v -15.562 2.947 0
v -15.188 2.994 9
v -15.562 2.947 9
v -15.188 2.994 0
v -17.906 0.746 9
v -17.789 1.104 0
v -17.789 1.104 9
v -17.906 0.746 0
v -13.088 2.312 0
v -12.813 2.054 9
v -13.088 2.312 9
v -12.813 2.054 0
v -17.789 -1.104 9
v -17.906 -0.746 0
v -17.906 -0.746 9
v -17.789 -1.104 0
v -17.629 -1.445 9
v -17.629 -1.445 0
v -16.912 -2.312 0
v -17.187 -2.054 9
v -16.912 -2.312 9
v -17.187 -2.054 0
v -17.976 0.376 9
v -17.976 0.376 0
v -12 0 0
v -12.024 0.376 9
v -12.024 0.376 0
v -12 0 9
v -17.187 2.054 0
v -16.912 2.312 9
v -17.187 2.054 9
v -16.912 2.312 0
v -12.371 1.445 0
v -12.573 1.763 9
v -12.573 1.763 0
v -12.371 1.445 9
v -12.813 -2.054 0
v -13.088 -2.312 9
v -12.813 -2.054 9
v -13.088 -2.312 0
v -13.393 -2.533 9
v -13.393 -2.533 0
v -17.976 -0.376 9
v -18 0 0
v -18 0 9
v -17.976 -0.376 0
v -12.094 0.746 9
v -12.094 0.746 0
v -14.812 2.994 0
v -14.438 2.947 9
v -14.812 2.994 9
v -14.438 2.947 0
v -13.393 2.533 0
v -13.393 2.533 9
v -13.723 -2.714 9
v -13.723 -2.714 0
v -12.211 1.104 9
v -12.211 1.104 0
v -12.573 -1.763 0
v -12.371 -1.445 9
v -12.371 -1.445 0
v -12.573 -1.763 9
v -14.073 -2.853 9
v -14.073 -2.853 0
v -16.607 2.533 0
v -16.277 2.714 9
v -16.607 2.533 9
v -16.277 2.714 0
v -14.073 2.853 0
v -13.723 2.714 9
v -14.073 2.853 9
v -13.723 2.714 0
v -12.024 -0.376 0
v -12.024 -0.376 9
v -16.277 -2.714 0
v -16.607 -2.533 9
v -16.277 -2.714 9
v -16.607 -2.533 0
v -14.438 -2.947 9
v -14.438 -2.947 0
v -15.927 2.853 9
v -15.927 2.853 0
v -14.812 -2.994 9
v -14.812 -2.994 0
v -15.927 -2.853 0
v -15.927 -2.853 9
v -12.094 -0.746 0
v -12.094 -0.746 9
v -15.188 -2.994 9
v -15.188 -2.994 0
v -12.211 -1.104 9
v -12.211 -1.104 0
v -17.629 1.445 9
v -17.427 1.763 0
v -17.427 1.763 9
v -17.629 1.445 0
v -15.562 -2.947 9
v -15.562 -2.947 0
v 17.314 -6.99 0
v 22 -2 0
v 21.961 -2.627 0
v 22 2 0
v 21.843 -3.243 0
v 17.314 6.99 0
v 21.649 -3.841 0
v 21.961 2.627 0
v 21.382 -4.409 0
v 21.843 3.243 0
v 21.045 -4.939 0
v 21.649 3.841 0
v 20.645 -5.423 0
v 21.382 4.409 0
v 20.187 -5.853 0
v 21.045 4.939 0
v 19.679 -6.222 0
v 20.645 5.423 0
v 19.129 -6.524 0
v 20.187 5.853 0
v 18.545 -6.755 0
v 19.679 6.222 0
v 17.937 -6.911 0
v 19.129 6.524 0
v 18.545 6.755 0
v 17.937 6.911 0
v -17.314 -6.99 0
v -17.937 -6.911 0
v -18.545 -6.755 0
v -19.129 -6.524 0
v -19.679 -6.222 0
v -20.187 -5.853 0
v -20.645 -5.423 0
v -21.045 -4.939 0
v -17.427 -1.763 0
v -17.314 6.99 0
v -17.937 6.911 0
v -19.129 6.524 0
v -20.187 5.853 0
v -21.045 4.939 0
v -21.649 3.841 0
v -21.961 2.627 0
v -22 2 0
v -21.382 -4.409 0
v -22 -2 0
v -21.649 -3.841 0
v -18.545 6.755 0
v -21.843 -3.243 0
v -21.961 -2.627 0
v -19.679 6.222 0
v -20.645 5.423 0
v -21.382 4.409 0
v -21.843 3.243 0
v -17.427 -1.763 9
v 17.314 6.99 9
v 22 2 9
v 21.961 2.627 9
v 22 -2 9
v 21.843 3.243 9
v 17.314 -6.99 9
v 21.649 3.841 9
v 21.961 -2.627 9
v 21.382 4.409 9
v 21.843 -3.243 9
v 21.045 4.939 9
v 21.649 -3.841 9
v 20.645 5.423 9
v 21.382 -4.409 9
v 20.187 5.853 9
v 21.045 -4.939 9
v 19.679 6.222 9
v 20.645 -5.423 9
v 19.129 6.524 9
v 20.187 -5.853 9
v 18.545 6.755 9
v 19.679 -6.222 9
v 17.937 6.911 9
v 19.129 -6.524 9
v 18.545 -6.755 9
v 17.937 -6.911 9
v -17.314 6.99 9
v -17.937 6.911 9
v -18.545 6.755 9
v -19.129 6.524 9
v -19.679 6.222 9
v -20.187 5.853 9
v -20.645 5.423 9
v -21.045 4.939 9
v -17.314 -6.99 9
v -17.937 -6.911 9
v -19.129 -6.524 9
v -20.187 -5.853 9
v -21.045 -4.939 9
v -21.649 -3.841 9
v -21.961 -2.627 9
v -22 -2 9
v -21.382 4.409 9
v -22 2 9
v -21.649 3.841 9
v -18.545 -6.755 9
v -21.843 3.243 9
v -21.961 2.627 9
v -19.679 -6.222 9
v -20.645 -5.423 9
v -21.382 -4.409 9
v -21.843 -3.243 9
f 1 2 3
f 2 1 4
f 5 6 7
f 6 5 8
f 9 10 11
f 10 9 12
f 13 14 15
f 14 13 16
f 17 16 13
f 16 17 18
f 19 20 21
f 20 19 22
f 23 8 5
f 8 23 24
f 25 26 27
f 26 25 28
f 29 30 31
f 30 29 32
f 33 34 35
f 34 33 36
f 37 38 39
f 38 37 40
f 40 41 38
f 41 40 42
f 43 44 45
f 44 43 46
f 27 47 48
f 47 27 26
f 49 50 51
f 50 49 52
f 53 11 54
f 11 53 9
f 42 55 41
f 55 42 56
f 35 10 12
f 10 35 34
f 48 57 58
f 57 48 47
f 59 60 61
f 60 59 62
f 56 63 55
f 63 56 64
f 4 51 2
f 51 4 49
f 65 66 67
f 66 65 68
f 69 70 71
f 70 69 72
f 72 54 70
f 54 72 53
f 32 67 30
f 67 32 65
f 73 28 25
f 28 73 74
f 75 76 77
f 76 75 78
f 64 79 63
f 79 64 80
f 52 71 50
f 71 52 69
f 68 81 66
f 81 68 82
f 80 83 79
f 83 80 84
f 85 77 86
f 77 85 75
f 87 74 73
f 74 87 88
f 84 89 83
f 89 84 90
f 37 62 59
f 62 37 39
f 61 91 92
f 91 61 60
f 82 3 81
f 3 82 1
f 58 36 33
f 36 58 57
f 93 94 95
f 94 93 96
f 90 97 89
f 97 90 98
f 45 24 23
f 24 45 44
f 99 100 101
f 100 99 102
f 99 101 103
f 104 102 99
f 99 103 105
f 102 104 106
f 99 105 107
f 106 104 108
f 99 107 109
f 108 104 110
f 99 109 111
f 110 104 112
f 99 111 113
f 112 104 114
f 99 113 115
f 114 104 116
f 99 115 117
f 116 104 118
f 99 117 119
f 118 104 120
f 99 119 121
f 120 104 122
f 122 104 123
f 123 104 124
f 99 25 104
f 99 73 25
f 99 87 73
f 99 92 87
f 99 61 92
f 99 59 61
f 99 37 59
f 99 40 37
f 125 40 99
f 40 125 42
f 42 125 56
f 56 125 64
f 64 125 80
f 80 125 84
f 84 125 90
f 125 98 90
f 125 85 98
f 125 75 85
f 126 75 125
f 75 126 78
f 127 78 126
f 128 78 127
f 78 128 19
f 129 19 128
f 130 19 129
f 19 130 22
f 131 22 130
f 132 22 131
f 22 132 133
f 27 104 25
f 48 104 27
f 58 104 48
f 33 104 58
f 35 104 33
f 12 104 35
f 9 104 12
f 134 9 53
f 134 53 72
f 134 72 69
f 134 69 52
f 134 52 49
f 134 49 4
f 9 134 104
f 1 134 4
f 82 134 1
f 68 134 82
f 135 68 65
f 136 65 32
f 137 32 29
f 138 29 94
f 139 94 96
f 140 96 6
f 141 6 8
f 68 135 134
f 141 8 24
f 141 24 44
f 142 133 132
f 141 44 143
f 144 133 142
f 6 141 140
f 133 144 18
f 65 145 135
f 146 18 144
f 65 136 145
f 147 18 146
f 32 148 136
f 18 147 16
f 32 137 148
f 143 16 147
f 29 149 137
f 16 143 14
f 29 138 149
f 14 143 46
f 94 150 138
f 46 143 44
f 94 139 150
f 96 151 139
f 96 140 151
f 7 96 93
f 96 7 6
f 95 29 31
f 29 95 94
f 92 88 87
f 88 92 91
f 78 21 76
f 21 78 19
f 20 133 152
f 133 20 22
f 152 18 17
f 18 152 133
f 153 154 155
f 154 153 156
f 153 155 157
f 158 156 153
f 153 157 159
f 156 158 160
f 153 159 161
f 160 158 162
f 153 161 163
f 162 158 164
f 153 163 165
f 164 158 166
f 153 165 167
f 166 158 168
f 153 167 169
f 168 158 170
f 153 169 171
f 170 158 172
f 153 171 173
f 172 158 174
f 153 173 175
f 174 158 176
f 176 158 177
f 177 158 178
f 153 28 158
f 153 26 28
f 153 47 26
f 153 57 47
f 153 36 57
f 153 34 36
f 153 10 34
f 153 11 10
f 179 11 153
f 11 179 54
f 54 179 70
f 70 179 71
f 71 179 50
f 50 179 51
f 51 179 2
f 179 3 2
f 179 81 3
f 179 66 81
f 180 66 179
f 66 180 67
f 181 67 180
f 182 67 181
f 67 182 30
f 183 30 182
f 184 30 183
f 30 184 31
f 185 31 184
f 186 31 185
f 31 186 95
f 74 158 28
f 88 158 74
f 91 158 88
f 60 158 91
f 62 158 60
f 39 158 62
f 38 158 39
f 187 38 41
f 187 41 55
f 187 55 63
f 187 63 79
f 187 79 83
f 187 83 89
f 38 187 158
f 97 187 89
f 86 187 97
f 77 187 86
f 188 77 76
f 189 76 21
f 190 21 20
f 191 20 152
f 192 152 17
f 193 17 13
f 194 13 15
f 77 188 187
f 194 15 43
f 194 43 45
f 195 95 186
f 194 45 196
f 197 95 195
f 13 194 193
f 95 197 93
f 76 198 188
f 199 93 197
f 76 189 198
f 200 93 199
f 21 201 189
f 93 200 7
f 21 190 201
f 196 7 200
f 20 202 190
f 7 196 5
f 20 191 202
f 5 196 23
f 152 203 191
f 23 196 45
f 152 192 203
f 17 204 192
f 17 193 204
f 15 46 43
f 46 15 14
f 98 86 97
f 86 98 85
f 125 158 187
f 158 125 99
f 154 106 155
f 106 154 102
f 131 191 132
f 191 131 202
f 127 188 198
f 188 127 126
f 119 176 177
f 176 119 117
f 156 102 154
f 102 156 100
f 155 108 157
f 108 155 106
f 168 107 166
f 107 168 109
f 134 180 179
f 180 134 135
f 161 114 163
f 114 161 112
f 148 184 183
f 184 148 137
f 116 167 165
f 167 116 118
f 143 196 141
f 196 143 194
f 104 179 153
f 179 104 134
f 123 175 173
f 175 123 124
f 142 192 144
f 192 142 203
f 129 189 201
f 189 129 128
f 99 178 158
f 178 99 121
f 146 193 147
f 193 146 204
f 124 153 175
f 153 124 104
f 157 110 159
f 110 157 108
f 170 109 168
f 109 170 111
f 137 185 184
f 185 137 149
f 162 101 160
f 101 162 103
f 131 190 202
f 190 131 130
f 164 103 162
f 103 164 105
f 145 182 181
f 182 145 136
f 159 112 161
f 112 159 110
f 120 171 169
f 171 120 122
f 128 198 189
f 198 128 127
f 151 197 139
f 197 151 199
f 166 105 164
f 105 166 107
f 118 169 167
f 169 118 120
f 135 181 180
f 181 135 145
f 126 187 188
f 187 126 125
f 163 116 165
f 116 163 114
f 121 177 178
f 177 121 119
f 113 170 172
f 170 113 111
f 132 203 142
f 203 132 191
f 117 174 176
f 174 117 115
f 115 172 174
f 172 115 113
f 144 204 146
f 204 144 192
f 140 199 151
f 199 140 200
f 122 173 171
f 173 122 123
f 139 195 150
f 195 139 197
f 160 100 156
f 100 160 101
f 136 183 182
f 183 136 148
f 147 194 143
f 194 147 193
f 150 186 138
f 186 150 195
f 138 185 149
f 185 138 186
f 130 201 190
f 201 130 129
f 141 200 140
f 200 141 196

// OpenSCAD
$fn = 50;


difference() {
	union() {
		hull() {
			translate(v = [-17.0000000000, 2.0000000000, 0]) {
				cylinder(h = 9, r = 5);
			}
			translate(v = [17.0000000000, 2.0000000000, 0]) {
				cylinder(h = 9, r = 5);
			}
			translate(v = [-17.0000000000, -2.0000000000, 0]) {
				cylinder(h = 9, r = 5);
			}
			translate(v = [17.0000000000, -2.0000000000, 0]) {
				cylinder(h = 9, r = 5);
			}
		}
	}
	union() {
		translate(v = [-15.0000000000, 0.0000000000, 0]) {
			cylinder(h = 9, r = 3.0000000000);
		}
		translate(v = [-15.0000000000, 0.0000000000, 0]) {
			cylinder(h = 9, r = 1.5000000000);
		}
		translate(v = [-15.0000000000, 0.0000000000, 0]) {
			cylinder(h = 9, r = 1.5000000000);
		}
		translate(v = [-15.0000000000, 0.0000000000, 0]) {
			cylinder(h = 9, r = 1.5000000000);
		}
	}
}
